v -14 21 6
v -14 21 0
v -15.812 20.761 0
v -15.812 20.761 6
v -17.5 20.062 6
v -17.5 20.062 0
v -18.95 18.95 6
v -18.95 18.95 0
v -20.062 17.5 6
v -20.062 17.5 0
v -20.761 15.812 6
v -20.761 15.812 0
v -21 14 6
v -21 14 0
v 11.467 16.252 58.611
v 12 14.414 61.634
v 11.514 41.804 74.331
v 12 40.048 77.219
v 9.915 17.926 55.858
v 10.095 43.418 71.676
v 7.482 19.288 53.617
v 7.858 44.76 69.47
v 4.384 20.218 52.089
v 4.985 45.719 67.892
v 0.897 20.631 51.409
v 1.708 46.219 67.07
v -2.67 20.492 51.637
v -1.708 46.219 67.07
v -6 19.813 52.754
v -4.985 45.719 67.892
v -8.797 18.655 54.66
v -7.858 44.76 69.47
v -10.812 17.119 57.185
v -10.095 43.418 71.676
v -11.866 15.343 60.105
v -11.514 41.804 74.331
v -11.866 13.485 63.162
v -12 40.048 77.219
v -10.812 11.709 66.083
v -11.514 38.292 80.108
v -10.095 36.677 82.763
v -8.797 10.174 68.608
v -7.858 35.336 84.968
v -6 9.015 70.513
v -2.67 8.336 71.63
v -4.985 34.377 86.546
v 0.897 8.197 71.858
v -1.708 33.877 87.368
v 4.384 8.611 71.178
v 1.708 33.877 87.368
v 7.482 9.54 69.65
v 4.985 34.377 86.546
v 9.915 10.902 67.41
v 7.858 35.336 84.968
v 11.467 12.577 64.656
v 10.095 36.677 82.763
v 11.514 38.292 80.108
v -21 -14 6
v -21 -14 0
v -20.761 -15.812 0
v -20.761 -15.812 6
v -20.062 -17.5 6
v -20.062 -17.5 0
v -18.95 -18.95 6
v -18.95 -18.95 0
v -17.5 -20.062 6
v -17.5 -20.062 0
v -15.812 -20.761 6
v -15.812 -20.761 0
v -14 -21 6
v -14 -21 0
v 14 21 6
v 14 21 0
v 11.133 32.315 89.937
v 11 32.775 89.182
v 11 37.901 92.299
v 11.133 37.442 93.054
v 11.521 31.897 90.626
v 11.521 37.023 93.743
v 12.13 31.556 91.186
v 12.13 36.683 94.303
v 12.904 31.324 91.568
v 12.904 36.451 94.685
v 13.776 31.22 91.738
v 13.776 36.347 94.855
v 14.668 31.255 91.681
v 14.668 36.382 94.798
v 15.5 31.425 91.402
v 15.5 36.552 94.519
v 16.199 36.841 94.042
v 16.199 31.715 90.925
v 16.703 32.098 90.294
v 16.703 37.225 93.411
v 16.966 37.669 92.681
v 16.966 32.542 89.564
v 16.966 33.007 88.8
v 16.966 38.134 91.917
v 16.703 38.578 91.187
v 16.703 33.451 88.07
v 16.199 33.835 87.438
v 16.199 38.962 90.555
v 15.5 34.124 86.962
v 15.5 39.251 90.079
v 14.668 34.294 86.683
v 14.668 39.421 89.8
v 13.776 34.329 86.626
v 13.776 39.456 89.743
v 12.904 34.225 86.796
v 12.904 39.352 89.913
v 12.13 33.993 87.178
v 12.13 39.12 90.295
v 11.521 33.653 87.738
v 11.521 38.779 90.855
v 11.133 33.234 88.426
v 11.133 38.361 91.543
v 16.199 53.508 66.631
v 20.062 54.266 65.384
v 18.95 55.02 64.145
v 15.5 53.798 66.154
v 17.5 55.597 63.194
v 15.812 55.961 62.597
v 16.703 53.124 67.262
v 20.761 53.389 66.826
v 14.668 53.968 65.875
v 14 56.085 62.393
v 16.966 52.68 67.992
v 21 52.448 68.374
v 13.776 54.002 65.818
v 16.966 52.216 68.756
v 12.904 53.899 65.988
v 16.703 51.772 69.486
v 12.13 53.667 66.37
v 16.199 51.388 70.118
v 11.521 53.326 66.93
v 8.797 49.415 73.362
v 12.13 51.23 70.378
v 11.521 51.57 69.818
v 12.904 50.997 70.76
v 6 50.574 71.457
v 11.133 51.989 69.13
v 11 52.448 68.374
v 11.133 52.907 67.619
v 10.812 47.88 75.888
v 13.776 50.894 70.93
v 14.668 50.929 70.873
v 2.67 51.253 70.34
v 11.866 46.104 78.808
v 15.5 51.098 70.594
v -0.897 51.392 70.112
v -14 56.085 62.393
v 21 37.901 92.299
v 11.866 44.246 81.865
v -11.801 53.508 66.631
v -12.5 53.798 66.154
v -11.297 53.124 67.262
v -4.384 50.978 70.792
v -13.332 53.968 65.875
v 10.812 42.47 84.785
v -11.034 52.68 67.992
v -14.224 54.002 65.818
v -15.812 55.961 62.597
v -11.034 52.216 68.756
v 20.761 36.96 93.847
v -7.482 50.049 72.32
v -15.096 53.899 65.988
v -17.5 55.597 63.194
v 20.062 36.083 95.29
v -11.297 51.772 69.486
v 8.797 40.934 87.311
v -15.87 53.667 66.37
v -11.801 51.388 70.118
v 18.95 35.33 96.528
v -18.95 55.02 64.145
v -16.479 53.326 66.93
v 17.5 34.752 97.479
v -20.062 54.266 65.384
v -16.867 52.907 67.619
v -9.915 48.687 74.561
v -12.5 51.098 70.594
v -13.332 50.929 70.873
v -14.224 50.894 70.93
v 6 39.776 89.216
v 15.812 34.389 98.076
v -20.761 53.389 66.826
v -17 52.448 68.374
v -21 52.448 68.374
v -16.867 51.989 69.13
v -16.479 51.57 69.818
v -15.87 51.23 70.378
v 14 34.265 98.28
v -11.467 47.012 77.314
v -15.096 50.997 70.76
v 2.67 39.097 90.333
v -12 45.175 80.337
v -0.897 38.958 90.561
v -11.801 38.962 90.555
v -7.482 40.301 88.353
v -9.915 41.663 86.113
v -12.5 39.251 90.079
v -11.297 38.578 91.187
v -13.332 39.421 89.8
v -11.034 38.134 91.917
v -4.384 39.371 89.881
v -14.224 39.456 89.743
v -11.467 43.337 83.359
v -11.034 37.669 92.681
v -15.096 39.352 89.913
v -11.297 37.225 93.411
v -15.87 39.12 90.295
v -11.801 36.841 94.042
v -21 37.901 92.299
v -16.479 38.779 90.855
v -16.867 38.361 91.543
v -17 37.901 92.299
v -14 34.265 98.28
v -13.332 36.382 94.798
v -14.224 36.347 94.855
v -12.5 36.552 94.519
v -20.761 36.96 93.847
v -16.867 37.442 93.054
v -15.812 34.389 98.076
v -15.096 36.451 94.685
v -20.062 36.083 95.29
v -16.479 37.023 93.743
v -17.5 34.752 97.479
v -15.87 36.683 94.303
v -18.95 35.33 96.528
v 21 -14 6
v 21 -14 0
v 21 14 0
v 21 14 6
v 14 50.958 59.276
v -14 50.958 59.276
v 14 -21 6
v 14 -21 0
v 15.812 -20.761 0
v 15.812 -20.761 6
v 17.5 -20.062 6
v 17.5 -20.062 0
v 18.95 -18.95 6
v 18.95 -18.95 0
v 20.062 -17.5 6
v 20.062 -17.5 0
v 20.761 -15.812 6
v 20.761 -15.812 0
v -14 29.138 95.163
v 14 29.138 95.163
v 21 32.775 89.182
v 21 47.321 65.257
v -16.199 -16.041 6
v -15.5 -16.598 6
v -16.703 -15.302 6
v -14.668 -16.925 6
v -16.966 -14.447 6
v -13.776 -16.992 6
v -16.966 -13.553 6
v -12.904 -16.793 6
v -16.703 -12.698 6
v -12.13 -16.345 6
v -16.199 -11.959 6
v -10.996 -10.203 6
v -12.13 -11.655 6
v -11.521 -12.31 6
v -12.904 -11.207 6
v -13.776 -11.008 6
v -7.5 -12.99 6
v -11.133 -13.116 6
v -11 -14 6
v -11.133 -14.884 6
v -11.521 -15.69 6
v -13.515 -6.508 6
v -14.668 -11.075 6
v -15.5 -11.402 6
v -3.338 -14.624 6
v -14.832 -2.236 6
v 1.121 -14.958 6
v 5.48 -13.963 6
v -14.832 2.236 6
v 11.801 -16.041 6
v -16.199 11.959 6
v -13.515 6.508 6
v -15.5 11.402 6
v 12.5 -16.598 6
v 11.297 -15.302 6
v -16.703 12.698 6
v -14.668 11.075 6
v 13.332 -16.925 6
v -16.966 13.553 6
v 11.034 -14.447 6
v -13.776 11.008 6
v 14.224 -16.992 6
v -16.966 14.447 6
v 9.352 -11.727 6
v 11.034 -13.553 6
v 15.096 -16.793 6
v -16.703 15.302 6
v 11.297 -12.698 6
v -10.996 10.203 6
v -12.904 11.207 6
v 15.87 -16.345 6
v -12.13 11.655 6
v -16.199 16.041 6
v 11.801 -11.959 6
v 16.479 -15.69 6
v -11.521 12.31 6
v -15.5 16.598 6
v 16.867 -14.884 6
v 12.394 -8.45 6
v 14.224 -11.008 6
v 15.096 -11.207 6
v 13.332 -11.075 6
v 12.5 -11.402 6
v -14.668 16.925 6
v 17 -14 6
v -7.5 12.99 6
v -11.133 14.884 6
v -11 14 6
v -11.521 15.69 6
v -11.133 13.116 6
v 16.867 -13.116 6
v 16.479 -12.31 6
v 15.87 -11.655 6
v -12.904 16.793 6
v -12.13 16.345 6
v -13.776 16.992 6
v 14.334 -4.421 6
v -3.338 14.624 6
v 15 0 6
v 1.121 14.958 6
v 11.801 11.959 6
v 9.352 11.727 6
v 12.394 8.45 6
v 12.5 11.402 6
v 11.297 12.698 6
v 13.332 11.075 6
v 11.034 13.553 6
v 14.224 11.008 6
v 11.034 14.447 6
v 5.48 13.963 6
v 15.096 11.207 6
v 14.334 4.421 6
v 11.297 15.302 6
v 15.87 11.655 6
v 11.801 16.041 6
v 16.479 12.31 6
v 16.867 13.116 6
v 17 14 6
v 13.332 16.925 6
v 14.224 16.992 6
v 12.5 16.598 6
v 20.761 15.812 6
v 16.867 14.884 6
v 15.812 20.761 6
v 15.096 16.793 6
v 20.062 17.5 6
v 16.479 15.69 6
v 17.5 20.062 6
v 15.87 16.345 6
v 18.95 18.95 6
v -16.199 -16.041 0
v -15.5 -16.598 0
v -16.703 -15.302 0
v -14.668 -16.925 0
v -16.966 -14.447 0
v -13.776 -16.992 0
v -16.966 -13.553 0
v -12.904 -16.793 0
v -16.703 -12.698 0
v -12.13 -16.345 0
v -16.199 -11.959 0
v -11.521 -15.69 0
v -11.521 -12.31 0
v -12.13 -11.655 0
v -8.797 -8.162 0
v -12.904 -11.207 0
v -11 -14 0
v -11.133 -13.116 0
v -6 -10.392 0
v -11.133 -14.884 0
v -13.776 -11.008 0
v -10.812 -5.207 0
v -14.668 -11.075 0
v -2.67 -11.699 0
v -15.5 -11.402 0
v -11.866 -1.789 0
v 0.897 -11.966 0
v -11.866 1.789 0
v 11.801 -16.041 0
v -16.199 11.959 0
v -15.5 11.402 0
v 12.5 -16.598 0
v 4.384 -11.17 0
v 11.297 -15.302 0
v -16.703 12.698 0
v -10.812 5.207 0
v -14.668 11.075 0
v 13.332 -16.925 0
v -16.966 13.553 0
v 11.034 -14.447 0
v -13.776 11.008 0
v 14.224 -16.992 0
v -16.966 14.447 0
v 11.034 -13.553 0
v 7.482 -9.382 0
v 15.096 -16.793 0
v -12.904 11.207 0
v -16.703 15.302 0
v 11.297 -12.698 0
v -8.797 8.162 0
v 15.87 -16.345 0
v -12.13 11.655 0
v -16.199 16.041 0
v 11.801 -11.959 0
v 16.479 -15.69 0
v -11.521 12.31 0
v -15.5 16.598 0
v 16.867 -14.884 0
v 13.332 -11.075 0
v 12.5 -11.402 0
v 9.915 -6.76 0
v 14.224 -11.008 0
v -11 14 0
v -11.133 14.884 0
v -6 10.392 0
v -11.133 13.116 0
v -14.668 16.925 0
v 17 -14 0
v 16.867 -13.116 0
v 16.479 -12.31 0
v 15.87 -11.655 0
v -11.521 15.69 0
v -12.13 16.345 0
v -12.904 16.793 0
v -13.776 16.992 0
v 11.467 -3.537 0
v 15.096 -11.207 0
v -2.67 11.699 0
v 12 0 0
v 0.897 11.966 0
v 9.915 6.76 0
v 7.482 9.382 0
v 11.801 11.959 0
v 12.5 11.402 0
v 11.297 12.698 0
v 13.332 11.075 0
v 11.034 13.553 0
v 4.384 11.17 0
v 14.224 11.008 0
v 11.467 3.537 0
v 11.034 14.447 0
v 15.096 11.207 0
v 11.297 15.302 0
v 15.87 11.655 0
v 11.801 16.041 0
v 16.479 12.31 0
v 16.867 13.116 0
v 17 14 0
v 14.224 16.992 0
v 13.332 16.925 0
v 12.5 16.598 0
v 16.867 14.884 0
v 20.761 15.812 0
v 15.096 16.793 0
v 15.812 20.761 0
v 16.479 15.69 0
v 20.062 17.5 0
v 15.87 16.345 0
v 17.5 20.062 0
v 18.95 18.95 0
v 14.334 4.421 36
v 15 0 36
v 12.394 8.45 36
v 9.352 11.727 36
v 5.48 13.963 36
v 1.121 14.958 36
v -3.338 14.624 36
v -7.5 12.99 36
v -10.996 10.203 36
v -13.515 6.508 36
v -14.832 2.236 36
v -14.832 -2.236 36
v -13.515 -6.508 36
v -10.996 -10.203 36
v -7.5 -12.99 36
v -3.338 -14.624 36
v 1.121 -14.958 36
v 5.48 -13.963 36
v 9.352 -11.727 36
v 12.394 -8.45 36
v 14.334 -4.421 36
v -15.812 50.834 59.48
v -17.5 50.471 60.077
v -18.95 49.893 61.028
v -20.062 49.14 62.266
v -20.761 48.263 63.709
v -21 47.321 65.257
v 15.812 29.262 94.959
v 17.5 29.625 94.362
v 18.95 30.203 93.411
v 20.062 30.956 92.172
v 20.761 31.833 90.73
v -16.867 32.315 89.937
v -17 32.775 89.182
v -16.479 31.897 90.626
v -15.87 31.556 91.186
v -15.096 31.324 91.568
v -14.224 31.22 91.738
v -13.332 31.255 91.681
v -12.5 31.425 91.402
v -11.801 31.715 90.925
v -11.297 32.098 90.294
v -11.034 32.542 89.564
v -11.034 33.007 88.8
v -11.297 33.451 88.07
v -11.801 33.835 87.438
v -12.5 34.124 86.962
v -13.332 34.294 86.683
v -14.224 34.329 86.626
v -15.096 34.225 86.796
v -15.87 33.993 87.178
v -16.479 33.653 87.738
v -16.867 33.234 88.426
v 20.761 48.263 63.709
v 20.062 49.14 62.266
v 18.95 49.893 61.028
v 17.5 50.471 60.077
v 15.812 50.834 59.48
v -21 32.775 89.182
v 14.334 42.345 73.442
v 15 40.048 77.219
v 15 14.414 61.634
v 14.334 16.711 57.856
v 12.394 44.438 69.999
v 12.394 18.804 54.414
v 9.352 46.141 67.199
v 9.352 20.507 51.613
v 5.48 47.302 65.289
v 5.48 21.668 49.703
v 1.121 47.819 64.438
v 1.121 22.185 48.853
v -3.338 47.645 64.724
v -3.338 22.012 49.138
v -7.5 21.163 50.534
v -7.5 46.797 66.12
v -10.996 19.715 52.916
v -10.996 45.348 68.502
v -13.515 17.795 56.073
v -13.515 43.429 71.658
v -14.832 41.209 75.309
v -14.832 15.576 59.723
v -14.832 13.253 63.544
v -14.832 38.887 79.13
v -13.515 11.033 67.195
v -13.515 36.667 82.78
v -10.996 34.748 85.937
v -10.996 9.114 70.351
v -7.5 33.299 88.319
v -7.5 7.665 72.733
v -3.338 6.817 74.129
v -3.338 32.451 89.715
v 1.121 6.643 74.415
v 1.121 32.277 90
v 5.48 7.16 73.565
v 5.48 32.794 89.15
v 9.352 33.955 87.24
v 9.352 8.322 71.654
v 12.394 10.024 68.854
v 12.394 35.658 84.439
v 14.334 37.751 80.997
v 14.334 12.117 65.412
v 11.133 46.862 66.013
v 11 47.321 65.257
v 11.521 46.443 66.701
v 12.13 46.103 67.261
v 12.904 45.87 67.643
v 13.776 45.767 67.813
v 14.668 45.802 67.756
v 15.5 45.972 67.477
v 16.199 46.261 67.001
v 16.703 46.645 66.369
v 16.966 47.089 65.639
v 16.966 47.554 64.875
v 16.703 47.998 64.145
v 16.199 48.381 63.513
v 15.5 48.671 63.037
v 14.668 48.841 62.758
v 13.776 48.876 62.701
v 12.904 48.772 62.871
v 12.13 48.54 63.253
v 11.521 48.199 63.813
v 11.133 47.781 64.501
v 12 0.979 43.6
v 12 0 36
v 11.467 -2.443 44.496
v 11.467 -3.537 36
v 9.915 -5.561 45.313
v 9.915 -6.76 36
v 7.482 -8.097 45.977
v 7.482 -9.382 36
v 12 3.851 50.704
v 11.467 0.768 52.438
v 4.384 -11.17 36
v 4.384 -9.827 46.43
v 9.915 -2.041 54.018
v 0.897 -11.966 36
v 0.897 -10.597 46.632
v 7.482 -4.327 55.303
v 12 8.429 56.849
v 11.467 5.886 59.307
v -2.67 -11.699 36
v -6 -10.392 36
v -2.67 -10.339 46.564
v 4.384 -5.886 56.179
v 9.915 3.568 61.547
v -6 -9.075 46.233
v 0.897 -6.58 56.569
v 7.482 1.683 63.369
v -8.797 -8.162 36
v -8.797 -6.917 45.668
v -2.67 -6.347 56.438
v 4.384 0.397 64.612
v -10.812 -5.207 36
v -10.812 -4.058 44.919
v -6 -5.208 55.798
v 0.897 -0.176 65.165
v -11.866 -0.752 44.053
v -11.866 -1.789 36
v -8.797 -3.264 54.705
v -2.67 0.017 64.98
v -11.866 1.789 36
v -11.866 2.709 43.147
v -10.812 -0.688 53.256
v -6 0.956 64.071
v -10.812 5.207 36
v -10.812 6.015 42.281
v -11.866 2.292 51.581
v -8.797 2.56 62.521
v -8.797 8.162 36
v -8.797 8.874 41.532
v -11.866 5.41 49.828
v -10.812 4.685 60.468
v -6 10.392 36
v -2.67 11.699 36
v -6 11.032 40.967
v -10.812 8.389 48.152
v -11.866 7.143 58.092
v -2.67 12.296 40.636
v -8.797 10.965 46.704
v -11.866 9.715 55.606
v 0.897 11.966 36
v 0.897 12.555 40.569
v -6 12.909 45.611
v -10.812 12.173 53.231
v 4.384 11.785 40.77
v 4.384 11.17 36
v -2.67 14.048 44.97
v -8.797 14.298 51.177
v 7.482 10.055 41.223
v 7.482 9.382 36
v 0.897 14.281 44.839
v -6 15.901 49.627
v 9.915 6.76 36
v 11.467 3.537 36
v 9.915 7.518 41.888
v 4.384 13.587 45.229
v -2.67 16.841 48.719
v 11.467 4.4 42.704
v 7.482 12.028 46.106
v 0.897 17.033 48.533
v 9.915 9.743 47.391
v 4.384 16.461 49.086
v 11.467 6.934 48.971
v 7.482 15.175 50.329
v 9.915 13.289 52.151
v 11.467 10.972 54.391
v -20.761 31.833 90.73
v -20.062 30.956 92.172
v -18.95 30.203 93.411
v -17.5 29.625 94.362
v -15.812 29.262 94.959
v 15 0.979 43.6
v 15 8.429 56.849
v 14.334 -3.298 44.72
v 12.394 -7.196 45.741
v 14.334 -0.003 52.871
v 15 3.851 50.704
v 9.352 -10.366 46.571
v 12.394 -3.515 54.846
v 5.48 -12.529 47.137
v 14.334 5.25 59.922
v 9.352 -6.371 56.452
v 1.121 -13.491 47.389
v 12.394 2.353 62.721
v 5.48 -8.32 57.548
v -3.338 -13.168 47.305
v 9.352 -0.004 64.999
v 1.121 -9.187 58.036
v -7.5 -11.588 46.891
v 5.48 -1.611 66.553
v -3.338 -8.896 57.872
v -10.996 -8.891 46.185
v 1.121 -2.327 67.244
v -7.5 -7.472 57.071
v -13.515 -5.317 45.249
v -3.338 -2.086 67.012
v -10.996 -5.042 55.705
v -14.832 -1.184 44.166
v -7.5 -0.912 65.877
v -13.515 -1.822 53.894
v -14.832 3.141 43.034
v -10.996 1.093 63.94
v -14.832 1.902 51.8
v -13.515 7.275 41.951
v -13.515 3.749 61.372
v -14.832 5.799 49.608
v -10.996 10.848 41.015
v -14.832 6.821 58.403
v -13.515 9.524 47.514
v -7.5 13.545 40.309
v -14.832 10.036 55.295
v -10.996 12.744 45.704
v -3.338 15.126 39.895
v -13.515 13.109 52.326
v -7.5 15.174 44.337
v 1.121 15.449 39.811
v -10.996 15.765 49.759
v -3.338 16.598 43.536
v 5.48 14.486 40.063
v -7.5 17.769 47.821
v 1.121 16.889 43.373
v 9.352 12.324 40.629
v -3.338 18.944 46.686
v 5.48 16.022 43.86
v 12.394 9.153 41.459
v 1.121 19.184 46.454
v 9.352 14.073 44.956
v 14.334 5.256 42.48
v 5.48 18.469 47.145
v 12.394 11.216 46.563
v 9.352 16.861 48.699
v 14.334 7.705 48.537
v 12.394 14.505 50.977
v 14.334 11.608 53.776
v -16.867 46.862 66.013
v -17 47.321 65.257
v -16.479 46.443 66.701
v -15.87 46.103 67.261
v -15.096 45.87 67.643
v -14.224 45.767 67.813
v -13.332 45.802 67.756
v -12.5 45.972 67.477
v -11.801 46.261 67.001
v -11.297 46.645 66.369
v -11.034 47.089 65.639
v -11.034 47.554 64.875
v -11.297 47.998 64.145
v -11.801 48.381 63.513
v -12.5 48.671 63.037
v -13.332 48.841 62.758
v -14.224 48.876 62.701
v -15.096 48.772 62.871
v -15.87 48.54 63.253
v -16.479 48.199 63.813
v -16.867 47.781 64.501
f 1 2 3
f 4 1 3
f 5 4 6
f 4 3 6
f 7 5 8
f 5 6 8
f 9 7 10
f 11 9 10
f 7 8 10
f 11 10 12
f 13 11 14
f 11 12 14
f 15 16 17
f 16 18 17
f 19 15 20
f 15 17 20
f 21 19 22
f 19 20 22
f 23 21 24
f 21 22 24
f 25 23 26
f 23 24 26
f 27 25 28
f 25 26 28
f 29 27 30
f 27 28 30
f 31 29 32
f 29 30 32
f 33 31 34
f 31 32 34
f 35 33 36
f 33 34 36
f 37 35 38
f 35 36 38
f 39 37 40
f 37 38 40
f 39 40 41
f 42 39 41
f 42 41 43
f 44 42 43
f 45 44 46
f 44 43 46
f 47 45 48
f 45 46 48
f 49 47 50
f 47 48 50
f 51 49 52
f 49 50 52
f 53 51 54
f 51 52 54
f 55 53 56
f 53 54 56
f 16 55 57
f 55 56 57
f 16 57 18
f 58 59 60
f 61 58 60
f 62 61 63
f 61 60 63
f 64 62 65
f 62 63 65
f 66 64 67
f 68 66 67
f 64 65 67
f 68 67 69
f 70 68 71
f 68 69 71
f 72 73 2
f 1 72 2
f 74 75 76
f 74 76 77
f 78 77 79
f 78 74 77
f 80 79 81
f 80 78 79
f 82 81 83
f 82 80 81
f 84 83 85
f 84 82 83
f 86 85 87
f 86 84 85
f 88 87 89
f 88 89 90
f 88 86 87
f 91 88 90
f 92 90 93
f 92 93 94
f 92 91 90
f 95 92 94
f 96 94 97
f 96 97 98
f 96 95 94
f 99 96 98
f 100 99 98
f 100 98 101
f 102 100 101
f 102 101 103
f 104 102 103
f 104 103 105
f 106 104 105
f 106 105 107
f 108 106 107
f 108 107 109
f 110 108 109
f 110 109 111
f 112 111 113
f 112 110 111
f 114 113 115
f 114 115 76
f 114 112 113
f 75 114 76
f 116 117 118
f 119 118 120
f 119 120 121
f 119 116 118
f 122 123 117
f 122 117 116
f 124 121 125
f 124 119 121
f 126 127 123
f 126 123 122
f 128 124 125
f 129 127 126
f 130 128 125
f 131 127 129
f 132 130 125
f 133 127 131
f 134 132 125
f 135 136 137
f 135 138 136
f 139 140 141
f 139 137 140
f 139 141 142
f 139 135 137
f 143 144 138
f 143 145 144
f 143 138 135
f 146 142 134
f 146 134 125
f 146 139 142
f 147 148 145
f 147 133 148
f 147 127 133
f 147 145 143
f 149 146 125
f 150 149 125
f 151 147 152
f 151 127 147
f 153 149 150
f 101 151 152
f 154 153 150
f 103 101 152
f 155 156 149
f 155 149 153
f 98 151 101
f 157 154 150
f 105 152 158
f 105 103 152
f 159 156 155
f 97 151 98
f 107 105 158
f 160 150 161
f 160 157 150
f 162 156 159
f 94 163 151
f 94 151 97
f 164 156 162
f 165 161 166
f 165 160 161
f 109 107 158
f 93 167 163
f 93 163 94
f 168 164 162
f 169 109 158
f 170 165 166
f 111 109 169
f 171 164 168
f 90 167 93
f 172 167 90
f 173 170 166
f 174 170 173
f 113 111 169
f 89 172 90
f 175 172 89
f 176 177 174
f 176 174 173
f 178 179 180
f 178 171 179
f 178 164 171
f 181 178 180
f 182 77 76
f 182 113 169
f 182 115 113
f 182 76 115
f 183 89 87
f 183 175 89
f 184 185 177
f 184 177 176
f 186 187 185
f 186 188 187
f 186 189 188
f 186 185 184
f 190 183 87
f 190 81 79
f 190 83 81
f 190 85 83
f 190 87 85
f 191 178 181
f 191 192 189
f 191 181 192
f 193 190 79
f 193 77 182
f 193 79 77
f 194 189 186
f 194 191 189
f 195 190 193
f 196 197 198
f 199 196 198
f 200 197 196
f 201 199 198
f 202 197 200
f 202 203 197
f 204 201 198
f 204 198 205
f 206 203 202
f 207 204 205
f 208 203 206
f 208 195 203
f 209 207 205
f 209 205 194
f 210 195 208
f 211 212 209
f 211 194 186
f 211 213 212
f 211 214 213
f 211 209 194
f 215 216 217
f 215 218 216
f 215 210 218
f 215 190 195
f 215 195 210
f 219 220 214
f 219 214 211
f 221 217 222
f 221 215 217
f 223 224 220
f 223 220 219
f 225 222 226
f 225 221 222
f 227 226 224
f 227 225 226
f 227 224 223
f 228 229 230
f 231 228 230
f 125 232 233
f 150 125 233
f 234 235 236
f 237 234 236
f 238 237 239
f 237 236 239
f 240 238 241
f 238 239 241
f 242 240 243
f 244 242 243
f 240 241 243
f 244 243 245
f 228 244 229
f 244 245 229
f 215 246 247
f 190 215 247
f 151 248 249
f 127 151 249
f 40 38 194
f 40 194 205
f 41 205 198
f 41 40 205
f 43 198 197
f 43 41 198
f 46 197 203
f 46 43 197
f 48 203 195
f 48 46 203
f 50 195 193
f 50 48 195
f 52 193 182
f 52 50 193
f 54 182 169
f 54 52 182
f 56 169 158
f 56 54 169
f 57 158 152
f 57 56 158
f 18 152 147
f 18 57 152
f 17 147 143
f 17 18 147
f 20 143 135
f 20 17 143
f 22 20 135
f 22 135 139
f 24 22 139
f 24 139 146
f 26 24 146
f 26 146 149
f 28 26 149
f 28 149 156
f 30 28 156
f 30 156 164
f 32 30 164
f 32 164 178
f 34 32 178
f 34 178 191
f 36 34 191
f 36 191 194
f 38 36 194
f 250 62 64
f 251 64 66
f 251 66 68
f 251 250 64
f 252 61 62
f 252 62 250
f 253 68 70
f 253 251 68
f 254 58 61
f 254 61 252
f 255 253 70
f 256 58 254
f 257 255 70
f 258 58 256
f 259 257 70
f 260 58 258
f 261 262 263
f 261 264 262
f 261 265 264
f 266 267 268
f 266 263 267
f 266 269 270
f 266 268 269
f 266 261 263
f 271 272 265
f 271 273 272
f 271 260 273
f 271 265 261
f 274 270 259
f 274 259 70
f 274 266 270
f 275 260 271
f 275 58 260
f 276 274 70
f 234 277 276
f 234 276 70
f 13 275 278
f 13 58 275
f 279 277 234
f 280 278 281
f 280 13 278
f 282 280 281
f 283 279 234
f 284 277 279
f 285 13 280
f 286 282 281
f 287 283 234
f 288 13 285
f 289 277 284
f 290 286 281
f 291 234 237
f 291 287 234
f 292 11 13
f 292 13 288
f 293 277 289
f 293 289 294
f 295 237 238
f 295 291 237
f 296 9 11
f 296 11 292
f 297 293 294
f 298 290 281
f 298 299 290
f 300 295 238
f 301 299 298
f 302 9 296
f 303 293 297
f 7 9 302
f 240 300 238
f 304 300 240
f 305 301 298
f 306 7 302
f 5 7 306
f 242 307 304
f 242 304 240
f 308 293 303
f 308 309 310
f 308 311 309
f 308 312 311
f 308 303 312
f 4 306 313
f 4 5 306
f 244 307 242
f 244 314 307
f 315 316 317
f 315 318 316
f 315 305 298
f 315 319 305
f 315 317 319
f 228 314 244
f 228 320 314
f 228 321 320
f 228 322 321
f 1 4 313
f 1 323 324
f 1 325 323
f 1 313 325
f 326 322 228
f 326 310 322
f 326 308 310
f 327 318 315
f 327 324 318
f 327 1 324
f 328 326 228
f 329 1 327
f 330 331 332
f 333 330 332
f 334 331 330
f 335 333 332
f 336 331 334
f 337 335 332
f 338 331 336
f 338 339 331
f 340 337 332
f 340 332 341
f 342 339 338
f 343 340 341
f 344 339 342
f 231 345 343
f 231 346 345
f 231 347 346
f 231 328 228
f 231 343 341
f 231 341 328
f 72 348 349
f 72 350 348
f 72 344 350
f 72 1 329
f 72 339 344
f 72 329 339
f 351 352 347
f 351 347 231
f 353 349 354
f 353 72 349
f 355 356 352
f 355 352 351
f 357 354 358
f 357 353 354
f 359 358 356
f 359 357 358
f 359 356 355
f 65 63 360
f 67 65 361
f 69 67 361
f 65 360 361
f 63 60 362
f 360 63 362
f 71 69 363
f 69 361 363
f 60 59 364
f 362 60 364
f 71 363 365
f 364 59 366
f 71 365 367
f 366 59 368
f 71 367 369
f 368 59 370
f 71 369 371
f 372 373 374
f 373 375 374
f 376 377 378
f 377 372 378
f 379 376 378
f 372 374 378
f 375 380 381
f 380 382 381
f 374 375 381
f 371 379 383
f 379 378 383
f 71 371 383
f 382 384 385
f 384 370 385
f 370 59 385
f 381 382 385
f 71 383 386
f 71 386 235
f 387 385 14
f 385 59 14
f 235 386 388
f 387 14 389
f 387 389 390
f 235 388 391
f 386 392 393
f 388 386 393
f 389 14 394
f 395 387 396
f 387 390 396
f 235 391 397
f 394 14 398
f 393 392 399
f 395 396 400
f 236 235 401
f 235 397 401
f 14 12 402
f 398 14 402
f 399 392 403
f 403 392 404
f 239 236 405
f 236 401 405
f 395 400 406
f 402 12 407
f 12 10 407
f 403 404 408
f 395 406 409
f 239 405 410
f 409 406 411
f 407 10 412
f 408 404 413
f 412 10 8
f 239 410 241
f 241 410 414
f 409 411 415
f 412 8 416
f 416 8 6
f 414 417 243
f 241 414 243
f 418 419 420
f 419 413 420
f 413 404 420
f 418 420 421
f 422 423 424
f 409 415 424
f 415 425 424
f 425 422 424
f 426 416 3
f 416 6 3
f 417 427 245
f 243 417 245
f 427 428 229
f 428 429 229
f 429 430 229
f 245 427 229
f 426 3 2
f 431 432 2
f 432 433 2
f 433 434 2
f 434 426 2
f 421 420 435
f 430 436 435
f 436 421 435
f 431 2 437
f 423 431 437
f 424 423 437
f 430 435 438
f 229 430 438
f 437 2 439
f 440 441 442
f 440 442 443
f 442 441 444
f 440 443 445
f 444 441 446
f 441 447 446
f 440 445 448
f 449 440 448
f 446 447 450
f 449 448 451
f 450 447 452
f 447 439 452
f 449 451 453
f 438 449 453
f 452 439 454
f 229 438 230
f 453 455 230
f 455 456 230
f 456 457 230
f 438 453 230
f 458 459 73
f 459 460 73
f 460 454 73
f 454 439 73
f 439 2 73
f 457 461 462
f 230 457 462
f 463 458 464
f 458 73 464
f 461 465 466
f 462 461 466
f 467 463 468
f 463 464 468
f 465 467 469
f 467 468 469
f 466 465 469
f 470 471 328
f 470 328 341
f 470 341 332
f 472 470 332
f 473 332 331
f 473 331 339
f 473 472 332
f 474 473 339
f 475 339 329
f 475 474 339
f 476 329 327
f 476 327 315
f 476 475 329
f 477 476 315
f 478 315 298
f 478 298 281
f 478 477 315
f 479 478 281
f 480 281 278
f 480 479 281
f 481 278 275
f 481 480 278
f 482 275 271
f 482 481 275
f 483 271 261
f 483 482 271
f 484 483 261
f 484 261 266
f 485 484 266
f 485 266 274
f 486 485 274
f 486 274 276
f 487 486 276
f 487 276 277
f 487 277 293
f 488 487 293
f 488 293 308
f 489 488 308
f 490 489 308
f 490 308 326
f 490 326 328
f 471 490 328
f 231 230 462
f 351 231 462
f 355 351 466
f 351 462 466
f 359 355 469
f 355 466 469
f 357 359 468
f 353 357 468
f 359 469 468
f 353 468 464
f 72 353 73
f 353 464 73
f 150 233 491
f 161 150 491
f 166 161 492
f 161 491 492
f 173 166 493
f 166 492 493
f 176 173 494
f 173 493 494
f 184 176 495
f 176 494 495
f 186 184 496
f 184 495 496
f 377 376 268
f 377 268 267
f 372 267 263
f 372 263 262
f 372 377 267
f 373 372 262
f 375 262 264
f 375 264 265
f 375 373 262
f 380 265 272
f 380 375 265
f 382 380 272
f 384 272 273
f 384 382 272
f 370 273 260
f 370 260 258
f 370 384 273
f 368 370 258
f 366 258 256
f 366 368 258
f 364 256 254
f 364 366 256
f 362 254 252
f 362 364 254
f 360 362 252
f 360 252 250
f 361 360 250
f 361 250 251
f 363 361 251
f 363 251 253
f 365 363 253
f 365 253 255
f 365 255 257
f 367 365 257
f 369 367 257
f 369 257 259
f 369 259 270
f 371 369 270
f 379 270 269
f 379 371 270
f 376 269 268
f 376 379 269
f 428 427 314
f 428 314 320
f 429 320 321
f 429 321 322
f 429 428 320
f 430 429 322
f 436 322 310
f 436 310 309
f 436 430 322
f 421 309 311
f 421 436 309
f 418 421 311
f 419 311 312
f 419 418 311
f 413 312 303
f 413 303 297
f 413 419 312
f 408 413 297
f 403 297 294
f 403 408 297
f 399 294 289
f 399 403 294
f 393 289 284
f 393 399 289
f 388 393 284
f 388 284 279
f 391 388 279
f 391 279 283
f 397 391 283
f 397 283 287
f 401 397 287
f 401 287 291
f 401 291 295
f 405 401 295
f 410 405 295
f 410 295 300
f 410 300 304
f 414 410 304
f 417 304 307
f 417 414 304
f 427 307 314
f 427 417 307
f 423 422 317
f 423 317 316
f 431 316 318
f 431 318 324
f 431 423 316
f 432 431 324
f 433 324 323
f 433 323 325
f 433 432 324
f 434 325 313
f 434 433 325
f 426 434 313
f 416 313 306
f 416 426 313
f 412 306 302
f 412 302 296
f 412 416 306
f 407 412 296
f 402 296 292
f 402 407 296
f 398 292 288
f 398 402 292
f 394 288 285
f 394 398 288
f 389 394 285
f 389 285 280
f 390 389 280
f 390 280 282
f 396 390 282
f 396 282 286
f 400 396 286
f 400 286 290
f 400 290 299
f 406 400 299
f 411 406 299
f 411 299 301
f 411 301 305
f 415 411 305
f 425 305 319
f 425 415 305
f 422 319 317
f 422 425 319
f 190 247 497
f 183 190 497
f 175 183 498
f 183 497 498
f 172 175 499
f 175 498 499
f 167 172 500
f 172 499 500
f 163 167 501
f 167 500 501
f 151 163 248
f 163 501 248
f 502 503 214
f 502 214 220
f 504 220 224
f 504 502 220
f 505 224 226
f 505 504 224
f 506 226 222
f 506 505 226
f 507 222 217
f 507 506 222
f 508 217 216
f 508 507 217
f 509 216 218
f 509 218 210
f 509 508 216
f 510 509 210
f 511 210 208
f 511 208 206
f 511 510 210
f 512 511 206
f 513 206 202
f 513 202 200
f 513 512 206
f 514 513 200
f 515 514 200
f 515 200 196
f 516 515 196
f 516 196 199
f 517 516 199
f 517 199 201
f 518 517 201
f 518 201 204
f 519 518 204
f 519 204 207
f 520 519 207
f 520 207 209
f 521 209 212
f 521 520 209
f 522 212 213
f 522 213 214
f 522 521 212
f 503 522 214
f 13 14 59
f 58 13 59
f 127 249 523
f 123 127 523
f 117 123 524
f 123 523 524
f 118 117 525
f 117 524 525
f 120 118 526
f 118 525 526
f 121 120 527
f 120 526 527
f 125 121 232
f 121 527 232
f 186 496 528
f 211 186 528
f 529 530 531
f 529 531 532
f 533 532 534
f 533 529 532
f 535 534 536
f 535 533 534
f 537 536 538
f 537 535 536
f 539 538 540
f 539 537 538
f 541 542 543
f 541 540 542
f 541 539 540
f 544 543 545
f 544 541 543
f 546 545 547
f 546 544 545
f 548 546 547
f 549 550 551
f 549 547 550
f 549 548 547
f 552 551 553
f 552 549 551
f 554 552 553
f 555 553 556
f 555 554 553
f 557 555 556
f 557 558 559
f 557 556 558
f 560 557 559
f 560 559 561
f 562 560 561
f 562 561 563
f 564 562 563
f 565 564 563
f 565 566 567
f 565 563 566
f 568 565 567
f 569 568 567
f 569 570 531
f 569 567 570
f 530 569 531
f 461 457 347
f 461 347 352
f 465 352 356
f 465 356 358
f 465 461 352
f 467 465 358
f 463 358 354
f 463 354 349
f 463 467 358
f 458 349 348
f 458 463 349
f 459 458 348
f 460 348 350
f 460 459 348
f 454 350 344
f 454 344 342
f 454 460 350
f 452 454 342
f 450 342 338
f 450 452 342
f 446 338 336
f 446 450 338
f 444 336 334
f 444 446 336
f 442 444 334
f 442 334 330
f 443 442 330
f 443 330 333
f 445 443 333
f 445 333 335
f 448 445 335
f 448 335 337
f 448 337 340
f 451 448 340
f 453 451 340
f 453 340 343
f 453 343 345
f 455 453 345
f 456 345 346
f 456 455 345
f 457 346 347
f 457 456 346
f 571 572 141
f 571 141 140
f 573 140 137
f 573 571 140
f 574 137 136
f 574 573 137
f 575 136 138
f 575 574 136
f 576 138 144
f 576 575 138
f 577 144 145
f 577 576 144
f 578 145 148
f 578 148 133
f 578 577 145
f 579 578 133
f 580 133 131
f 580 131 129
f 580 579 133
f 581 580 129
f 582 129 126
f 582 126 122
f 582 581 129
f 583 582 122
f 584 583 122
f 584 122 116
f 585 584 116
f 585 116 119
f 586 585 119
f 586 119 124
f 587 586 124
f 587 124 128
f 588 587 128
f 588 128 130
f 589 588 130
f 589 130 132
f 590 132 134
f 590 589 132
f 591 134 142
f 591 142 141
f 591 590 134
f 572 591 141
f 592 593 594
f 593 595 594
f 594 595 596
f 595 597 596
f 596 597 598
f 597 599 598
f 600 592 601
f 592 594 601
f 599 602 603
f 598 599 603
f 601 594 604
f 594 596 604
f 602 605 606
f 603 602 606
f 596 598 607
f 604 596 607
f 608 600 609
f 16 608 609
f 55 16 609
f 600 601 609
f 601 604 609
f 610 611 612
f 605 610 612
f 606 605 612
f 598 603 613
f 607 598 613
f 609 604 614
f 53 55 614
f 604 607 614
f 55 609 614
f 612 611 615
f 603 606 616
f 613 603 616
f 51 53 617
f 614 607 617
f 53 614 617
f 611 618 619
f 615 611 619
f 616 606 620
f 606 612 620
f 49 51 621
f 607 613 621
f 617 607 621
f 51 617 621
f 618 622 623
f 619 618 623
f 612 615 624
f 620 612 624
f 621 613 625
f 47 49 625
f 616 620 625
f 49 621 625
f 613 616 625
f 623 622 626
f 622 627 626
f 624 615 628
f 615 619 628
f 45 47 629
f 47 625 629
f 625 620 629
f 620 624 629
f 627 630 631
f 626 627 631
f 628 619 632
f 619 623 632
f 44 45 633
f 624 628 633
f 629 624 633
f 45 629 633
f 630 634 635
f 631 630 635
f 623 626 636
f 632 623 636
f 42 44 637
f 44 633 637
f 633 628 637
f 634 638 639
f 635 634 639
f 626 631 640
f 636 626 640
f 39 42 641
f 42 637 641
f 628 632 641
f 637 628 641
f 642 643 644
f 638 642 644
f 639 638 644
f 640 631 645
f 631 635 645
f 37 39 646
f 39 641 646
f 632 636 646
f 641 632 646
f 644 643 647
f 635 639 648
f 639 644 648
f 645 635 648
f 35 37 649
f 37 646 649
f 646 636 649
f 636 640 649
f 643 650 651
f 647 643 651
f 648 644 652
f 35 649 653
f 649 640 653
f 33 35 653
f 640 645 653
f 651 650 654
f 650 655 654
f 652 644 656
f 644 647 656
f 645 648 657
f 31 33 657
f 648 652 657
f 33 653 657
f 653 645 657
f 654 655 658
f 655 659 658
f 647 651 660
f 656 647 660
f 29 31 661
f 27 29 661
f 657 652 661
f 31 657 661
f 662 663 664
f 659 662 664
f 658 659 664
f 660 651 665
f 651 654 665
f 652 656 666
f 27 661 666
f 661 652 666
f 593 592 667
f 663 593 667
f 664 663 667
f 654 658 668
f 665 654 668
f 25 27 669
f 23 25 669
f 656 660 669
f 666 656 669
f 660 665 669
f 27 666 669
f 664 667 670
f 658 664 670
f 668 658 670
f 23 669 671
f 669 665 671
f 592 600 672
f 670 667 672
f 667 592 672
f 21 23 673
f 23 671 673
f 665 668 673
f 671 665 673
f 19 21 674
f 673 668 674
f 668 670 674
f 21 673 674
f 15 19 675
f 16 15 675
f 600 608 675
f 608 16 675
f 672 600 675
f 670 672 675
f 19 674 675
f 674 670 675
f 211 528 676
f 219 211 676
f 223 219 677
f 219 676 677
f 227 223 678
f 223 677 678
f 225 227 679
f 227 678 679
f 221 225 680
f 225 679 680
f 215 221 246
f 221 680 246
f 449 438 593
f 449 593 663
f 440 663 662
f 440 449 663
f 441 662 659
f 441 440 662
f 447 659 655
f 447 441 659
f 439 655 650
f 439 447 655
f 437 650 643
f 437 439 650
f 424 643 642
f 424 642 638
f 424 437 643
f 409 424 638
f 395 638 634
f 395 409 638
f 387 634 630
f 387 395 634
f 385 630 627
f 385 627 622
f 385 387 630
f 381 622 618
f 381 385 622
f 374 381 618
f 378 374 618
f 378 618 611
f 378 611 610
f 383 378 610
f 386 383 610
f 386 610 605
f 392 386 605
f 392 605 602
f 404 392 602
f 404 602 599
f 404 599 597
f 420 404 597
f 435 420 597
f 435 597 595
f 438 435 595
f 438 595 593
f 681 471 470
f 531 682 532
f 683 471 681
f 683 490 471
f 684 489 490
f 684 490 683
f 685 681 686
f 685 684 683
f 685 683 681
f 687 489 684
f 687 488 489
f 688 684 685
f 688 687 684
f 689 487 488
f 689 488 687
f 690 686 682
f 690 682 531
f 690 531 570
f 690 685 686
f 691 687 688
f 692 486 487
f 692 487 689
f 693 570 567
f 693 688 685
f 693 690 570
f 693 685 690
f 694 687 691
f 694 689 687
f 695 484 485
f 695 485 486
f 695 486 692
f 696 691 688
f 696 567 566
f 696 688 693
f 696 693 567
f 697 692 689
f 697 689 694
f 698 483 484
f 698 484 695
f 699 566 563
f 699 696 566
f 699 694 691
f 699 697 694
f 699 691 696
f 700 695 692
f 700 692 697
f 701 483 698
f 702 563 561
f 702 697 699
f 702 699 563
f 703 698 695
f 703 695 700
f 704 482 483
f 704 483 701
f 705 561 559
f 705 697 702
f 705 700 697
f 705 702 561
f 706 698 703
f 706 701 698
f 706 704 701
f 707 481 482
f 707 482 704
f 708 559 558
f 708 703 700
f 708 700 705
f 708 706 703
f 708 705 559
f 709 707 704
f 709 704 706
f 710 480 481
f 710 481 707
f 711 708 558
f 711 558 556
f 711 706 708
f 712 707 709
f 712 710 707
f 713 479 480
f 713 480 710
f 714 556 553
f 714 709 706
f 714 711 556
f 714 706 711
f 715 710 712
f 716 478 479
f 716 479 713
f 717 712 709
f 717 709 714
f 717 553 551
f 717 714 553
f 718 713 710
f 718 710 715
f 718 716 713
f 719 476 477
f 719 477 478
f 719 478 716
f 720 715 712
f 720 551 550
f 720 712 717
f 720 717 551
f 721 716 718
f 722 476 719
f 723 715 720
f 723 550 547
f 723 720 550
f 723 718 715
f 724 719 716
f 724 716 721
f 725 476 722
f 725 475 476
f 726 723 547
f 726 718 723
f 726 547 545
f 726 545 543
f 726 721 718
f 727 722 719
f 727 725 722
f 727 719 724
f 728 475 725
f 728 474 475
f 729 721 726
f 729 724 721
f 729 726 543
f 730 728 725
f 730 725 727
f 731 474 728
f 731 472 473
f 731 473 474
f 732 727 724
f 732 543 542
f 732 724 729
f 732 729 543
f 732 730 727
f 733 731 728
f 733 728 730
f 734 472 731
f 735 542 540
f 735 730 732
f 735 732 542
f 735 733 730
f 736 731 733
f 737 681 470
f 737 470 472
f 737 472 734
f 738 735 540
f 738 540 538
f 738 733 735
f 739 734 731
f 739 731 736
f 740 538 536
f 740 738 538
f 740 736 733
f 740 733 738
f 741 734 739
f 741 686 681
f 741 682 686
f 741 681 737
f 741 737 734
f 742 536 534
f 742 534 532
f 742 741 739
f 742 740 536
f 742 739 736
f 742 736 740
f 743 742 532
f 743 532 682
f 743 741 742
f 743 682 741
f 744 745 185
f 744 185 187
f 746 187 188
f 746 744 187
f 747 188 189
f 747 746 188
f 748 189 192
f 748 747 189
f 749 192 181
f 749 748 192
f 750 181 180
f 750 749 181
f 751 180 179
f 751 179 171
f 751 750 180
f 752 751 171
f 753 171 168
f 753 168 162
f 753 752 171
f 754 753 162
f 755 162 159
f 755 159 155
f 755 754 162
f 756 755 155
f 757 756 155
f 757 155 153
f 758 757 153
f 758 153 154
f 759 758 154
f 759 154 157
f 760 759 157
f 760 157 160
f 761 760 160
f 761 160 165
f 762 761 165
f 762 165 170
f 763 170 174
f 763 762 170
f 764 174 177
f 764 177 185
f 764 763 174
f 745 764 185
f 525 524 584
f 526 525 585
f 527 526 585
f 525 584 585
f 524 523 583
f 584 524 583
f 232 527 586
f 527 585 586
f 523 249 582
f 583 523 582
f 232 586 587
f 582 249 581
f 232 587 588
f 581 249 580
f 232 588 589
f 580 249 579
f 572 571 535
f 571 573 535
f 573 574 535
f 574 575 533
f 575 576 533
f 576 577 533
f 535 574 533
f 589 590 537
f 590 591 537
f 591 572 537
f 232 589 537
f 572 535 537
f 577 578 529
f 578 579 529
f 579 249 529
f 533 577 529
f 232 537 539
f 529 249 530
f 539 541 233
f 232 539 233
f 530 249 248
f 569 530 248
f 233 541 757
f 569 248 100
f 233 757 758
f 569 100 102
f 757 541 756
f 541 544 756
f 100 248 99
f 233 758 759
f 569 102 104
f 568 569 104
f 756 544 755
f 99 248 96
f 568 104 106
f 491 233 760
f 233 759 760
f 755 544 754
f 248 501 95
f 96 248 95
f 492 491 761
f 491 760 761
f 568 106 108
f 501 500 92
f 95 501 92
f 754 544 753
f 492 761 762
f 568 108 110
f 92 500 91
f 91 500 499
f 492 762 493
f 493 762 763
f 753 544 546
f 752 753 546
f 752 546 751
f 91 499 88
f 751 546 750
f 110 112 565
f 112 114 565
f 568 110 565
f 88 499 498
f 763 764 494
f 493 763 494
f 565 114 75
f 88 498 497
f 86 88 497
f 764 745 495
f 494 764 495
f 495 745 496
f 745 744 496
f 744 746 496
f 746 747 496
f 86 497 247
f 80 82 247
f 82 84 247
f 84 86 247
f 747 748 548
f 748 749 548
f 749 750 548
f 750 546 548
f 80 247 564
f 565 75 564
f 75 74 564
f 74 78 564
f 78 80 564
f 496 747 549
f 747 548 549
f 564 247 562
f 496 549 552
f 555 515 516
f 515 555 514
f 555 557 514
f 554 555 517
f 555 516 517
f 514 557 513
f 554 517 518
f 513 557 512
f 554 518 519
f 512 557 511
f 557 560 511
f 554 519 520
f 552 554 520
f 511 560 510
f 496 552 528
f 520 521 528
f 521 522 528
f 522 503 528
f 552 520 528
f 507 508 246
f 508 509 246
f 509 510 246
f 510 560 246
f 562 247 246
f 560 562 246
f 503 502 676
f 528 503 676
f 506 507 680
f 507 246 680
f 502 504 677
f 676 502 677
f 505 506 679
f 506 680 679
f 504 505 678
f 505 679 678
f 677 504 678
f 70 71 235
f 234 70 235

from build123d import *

# Parameters (mm, degrees)
F0_R     = 3
F0_R_2   = 12
F1_DEPTH = 6
F2_R     = 15
F2_R_2   = 12
F5_R     = 3
F5_R_2   = 12
F6_DEPTH = 6


with BuildPart() as f1:
    # F0 (on Top) → F1 (new body)
    with BuildSketch(Plane.XY):
        with BuildLine():
            Line((-14, -21), (14, -21))
            ThreePointArc((14, -21), (18.9497474683, -18.9497474683), (21, -14))
            Line((21, -14), (21, 14))
            ThreePointArc((21, 14), (18.9497474683, 18.9497474683), (14, 21))
            Line((14, 21), (-14, 21))
            ThreePointArc((-14, 21), (-18.9497474683, 18.9497474683), (-21, 14))
            Line((-21, 14), (-21, -14))
            ThreePointArc((-21, -14), (-18.9497474683, -18.9497474683), (-14, -21))
        make_face()
        with Locations((-14, -14)):
            Circle(F0_R, mode=Mode.SUBTRACT)
        with Locations((14, -14)):
            Circle(F0_R, mode=Mode.SUBTRACT)
        with Locations((-14, 14)):
            Circle(F0_R, mode=Mode.SUBTRACT)
        Circle(F0_R_2, mode=Mode.SUBTRACT)
        with Locations((14, 14)):
            Circle(F0_R, mode=Mode.SUBTRACT)
    extrude(amount=F1_DEPTH)

    # F4: sweep along a path in F3
    with BuildLine(Plane.YZ) as f4_path:
        Line((0, 6), (0, 36))
        ThreePointArc((0, 36), (3.8507080753, 50.7042351666), (14.4143021224, 61.6336891935))
        Line((14.4143021224, 61.6336891935), (40.0479913159, 77.2193870711))
    # F2 (on face) → F4 (sweep)
    with BuildSketch(Plane.XY.offset(6)):
        Circle(F2_R)
        Circle(F2_R_2, mode=Mode.SUBTRACT)
    sweep(path=f4_path.line)

    # F5 (on face) → F6 (join)
    with BuildSketch(Plane(origin=(0, 63.5173139927, 38.6195548528), x_dir=(-1, 0, 0), z_dir=(0, 0.8544563064, 0.5195232626))):
        with BuildLine():
            Line((-14, 24.1747291546), (14, 24.1747291546))
            ThreePointArc((14, 24.1747291546), (18.9497474683, 26.2249816863), (21, 31.1747291546))
            Line((21, 31.1747291546), (21, 59.1747291546))
            ThreePointArc((21, 59.1747291546), (18.9497474683, 64.1244766229), (14, 66.1747291546))
            Line((14, 66.1747291546), (-14, 66.1747291546))
            ThreePointArc((-14, 66.1747291546), (-18.9497474683, 64.1244766229), (-21, 59.1747291546))
            Line((-21, 59.1747291546), (-21, 31.1747291546))
            ThreePointArc((-21, 31.1747291546), (-18.9497474683, 26.2249816863), (-14, 24.1747291546))
        make_face()
        with Locations((-14, 31.1747291546)):
            Circle(F5_R, mode=Mode.SUBTRACT)
        with Locations((14, 31.1747291546)):
            Circle(F5_R, mode=Mode.SUBTRACT)
        with Locations((0, 45.1747291546)):
            Circle(F5_R_2, mode=Mode.SUBTRACT)
        with Locations((-14, 59.1747291546)):
            Circle(F5_R, mode=Mode.SUBTRACT)
        with Locations((14, 59.1747291546)):
            Circle(F5_R, mode=Mode.SUBTRACT)
    extrude(amount=F6_DEPTH)


solid = f1.part
